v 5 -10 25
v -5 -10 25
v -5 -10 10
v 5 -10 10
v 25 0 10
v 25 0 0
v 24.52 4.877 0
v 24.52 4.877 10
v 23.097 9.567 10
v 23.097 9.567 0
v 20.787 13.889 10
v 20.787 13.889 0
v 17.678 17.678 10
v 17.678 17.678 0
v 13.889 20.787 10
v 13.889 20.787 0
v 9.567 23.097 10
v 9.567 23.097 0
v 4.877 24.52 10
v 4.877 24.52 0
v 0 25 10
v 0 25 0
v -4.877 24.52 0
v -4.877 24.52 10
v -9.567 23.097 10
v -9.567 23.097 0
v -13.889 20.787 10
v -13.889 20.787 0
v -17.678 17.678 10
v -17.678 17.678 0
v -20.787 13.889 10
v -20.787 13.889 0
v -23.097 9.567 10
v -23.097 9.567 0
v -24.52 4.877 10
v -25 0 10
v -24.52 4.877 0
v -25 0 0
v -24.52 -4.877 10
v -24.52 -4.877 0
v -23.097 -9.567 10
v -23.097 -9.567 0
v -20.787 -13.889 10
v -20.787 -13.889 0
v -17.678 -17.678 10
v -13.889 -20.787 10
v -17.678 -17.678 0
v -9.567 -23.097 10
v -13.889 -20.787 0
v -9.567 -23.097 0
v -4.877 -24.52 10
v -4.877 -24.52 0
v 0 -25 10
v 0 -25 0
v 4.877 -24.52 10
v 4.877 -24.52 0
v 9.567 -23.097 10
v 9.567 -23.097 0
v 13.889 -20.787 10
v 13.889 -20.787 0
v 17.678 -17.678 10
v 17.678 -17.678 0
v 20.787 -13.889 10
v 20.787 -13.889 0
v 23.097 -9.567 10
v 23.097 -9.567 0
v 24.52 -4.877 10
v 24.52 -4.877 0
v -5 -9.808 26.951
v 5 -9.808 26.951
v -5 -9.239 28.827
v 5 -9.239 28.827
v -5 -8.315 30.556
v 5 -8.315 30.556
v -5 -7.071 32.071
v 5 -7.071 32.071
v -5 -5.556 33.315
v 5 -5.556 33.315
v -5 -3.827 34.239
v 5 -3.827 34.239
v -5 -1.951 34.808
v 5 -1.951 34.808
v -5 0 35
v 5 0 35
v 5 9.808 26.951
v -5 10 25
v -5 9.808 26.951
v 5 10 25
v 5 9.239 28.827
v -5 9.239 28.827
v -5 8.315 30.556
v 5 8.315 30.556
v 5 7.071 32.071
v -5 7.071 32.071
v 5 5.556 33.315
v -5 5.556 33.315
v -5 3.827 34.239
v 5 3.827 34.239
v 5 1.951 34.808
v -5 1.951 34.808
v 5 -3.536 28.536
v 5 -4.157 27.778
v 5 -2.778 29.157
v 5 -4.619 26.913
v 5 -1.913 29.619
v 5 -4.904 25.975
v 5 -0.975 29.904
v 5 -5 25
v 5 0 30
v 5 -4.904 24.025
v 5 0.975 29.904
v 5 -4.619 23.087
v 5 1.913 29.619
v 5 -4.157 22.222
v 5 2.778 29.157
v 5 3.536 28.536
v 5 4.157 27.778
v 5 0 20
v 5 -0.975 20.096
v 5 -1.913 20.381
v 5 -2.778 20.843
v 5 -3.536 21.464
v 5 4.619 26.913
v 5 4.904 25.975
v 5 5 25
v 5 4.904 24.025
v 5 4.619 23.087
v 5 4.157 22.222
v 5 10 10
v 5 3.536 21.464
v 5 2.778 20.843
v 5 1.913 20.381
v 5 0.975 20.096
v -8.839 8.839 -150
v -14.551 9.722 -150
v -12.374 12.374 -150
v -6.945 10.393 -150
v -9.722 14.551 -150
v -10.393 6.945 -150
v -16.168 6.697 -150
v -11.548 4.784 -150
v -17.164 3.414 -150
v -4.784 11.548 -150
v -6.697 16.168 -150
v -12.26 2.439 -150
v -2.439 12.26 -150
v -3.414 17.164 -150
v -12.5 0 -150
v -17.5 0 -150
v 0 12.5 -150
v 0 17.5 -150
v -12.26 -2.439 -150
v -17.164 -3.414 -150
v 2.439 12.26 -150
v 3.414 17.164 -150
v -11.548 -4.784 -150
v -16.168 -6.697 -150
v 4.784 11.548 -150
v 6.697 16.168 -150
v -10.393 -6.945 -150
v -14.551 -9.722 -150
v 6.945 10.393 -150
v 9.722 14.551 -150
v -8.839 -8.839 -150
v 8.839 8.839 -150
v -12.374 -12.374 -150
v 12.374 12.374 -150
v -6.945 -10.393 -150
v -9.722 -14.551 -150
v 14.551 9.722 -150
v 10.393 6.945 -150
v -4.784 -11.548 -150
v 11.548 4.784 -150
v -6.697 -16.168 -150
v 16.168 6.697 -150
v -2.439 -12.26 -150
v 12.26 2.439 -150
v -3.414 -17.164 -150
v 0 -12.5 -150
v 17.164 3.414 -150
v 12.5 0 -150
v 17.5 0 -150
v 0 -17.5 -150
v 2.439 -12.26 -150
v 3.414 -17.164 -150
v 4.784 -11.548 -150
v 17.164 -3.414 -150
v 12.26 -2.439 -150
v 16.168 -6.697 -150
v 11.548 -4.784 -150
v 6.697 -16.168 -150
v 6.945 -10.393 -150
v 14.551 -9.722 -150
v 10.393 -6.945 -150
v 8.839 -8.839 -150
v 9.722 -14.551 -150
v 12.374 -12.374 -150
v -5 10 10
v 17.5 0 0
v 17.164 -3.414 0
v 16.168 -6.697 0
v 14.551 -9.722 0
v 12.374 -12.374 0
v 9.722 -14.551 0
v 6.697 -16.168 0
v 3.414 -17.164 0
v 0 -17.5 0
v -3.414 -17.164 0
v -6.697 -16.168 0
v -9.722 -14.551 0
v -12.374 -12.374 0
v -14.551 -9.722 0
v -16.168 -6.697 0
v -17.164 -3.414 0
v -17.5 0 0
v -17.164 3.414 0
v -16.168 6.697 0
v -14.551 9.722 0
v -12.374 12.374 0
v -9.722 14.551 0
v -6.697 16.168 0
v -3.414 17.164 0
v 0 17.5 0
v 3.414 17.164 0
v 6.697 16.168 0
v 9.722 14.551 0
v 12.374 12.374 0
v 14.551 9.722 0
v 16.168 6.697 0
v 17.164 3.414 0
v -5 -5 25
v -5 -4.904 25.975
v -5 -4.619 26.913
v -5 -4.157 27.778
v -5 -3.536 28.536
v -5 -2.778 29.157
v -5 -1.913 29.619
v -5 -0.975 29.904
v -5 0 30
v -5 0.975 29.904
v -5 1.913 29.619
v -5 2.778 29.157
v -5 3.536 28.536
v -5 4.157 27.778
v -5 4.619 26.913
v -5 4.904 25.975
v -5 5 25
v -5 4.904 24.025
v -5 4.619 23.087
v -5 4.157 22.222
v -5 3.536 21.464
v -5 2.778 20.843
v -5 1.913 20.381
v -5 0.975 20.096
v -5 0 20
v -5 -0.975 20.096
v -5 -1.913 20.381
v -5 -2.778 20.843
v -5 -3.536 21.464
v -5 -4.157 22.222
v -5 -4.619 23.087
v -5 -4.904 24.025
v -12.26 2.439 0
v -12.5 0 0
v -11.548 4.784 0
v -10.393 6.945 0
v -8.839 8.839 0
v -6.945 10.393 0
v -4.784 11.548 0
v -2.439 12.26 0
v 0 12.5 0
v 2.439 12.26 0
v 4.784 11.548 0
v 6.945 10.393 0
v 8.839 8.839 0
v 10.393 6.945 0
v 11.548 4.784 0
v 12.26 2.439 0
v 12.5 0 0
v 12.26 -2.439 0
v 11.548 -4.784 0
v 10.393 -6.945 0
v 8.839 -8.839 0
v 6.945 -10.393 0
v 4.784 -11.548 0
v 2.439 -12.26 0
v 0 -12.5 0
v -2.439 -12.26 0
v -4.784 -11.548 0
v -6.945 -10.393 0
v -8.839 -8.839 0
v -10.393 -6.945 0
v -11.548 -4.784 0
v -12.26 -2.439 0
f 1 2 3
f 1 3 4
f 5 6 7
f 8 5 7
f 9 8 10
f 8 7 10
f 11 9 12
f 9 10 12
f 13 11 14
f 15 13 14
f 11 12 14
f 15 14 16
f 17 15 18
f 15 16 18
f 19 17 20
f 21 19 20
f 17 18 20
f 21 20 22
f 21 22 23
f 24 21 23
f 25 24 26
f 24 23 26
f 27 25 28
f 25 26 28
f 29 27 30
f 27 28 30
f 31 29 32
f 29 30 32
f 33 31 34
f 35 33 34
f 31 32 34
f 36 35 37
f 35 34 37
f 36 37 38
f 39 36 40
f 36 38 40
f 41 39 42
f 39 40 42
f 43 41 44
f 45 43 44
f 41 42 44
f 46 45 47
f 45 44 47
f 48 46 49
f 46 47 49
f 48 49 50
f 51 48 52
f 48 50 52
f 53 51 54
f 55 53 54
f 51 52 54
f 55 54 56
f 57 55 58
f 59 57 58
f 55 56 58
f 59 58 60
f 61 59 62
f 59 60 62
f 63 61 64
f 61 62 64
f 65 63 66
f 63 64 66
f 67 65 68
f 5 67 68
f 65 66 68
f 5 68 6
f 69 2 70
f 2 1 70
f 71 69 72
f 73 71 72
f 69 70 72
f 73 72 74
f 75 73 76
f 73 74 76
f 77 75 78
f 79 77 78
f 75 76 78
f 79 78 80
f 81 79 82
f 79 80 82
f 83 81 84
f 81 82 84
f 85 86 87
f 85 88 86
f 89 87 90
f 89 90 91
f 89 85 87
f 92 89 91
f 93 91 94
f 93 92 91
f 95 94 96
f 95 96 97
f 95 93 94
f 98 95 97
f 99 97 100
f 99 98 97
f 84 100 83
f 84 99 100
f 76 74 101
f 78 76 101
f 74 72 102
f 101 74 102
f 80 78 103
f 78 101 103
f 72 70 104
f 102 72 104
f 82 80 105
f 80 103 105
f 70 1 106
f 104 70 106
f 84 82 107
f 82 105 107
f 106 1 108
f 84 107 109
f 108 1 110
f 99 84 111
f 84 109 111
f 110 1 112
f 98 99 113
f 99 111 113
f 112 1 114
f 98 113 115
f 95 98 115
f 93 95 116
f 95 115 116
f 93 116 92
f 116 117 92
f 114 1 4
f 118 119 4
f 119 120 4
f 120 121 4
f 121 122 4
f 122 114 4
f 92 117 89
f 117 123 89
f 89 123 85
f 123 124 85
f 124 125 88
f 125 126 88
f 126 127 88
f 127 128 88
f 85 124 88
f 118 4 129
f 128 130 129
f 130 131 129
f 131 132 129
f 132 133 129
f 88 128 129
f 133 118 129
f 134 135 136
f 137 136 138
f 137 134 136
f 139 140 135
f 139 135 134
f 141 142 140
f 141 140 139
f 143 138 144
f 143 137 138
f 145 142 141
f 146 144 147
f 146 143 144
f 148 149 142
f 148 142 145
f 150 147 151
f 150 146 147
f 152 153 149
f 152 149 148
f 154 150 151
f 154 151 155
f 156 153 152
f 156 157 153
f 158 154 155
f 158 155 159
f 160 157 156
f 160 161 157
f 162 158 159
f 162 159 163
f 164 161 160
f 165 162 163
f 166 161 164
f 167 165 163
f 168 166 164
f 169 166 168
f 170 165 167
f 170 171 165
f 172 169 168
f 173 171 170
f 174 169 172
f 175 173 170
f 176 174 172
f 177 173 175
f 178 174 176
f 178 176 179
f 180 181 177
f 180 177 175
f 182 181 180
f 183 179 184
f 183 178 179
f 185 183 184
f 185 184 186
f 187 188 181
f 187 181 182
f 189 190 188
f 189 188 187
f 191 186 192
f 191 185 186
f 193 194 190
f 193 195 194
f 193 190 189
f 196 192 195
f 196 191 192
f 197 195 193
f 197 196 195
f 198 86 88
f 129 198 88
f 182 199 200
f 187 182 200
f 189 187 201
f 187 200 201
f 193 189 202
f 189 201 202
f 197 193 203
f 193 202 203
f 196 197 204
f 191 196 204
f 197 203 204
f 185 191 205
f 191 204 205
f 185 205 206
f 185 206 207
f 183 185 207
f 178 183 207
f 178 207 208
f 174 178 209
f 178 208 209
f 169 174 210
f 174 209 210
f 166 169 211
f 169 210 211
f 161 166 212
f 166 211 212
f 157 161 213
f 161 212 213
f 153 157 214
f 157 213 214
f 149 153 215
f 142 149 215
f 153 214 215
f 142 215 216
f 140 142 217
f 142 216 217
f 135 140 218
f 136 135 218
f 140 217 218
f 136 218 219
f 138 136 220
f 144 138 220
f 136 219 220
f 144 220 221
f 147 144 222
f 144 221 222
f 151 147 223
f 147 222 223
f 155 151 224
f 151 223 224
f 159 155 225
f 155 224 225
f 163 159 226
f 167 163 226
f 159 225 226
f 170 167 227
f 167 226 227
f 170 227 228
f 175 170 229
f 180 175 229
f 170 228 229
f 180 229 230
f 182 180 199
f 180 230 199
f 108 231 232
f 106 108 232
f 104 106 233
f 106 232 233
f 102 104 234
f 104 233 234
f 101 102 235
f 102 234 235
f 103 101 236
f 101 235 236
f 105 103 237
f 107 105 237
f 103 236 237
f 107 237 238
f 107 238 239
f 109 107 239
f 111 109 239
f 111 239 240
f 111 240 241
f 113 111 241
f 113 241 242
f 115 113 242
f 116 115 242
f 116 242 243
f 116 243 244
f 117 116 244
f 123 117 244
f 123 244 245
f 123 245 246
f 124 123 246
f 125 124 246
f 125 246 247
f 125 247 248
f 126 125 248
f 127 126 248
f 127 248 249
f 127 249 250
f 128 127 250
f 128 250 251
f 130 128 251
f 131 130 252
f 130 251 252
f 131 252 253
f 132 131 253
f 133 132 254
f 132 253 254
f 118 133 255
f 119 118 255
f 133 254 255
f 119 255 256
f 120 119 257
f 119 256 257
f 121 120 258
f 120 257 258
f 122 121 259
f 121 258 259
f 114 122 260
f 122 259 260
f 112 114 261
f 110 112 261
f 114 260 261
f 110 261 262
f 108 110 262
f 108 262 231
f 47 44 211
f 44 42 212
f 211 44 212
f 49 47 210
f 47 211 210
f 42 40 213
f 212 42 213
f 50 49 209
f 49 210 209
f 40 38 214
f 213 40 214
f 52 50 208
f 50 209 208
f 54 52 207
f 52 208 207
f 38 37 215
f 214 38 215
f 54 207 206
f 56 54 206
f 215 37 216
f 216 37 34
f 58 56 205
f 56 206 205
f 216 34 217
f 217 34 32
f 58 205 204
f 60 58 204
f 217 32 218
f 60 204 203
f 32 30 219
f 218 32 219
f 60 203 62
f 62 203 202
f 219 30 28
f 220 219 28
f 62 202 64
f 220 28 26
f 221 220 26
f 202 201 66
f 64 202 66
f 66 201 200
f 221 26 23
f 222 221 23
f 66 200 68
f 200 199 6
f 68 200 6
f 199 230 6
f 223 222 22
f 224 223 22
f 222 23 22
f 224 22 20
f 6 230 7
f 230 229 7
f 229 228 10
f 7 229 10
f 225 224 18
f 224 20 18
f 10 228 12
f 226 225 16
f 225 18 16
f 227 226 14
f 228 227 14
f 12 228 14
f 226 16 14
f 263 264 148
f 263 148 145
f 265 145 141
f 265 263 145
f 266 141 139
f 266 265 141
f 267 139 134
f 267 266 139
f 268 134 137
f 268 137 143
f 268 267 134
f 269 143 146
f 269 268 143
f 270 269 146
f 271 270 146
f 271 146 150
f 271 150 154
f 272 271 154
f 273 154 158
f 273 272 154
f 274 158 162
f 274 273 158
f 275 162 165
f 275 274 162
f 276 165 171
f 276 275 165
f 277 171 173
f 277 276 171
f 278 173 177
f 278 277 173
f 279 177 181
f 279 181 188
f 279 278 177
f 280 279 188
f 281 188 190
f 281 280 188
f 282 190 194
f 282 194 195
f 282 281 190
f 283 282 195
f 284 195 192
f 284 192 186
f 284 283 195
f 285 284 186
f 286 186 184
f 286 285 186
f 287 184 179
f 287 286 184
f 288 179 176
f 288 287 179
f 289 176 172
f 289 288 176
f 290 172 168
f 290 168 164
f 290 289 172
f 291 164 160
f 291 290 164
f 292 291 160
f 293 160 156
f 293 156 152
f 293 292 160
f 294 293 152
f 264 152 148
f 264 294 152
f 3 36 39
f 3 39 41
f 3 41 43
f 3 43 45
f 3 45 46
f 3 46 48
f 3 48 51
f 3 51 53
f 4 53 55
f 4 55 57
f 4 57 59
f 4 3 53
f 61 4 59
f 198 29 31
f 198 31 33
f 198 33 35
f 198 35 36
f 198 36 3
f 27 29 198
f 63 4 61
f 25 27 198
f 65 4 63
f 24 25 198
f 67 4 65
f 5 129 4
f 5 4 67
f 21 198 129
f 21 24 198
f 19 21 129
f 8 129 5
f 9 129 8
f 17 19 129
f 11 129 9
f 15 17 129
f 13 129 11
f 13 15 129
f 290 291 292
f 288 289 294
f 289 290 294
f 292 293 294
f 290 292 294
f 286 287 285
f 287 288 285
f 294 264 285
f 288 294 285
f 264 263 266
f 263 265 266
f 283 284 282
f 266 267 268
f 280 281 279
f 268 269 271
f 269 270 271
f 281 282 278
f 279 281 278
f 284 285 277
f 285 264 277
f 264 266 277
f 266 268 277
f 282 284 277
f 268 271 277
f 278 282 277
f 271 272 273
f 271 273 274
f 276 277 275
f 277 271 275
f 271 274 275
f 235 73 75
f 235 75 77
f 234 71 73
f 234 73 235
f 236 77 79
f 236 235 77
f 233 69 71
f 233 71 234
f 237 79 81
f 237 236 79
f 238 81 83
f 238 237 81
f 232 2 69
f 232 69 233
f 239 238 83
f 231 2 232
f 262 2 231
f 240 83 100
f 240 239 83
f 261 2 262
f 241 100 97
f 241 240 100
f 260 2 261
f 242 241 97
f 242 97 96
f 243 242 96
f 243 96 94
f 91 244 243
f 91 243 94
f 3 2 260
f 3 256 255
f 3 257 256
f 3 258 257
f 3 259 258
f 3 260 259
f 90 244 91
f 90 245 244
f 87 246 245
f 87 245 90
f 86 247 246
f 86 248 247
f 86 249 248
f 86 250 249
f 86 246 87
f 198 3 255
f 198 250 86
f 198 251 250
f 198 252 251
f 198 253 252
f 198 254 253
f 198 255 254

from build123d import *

# Parameters (mm, degrees)
SKETCH2_R           = 25
BOSS_EXTRUDE2_DEPTH = 10
SKETCH3_W           = 10
SKETCH3_H           = 20
BOSS_EXTRUDE3_DEPTH = 25
SKETCH4_R           = 5
CUT_EXTRUDE1_DEPTH  = 20
FILLET1_R           = 10
SKETCH5_R           = 17.5
SKETCH5_R_2         = 12.5
BOSS_EXTRUDE4_DEPTH = 150


with BuildPart() as part:
    # Sketch2 → Boss-Extrude2 (new body)
    with BuildSketch(Plane.XY):
        Circle(SKETCH2_R)
    extrude(amount=BOSS_EXTRUDE2_DEPTH)

    # Sketch3 → Boss-Extrude3 (add)
    with BuildSketch(Plane.XY.offset(10)):
        Rectangle(SKETCH3_W, SKETCH3_H)
    extrude(amount=BOSS_EXTRUDE3_DEPTH)

    # Sketch4 → Cut-Extrude1 (cut)
    with BuildSketch(Plane.ZY.offset(5)):
        with Locations(Location((25, 0, 0), (0, 0, 270))):
            Circle(SKETCH4_R)
    extrude(amount=-CUT_EXTRUDE1_DEPTH, mode=Mode.SUBTRACT)

    # Fillet1
    fillet1_edges = [part.edges().sort_by_distance(p)[0] for p in [
        (0, -10, 35),
        (0, 10, 35),
    ]]
    fillet(fillet1_edges, radius=FILLET1_R - 0.0001)  # a hair under: the kernel refuses the full size

    # Sketch5 → Boss-Extrude4 (add)
    with BuildSketch(Plane(origin=(0, 0, 0), x_dir=(-1, 0, 0), z_dir=(0, 0, -1))):
        with Locations(Location((0, 0, 0), (0, 0, 180))):
            Circle(SKETCH5_R)
        Circle(SKETCH5_R_2, mode=Mode.SUBTRACT)
    extrude(amount=BOSS_EXTRUDE4_DEPTH)


solid = part.part
